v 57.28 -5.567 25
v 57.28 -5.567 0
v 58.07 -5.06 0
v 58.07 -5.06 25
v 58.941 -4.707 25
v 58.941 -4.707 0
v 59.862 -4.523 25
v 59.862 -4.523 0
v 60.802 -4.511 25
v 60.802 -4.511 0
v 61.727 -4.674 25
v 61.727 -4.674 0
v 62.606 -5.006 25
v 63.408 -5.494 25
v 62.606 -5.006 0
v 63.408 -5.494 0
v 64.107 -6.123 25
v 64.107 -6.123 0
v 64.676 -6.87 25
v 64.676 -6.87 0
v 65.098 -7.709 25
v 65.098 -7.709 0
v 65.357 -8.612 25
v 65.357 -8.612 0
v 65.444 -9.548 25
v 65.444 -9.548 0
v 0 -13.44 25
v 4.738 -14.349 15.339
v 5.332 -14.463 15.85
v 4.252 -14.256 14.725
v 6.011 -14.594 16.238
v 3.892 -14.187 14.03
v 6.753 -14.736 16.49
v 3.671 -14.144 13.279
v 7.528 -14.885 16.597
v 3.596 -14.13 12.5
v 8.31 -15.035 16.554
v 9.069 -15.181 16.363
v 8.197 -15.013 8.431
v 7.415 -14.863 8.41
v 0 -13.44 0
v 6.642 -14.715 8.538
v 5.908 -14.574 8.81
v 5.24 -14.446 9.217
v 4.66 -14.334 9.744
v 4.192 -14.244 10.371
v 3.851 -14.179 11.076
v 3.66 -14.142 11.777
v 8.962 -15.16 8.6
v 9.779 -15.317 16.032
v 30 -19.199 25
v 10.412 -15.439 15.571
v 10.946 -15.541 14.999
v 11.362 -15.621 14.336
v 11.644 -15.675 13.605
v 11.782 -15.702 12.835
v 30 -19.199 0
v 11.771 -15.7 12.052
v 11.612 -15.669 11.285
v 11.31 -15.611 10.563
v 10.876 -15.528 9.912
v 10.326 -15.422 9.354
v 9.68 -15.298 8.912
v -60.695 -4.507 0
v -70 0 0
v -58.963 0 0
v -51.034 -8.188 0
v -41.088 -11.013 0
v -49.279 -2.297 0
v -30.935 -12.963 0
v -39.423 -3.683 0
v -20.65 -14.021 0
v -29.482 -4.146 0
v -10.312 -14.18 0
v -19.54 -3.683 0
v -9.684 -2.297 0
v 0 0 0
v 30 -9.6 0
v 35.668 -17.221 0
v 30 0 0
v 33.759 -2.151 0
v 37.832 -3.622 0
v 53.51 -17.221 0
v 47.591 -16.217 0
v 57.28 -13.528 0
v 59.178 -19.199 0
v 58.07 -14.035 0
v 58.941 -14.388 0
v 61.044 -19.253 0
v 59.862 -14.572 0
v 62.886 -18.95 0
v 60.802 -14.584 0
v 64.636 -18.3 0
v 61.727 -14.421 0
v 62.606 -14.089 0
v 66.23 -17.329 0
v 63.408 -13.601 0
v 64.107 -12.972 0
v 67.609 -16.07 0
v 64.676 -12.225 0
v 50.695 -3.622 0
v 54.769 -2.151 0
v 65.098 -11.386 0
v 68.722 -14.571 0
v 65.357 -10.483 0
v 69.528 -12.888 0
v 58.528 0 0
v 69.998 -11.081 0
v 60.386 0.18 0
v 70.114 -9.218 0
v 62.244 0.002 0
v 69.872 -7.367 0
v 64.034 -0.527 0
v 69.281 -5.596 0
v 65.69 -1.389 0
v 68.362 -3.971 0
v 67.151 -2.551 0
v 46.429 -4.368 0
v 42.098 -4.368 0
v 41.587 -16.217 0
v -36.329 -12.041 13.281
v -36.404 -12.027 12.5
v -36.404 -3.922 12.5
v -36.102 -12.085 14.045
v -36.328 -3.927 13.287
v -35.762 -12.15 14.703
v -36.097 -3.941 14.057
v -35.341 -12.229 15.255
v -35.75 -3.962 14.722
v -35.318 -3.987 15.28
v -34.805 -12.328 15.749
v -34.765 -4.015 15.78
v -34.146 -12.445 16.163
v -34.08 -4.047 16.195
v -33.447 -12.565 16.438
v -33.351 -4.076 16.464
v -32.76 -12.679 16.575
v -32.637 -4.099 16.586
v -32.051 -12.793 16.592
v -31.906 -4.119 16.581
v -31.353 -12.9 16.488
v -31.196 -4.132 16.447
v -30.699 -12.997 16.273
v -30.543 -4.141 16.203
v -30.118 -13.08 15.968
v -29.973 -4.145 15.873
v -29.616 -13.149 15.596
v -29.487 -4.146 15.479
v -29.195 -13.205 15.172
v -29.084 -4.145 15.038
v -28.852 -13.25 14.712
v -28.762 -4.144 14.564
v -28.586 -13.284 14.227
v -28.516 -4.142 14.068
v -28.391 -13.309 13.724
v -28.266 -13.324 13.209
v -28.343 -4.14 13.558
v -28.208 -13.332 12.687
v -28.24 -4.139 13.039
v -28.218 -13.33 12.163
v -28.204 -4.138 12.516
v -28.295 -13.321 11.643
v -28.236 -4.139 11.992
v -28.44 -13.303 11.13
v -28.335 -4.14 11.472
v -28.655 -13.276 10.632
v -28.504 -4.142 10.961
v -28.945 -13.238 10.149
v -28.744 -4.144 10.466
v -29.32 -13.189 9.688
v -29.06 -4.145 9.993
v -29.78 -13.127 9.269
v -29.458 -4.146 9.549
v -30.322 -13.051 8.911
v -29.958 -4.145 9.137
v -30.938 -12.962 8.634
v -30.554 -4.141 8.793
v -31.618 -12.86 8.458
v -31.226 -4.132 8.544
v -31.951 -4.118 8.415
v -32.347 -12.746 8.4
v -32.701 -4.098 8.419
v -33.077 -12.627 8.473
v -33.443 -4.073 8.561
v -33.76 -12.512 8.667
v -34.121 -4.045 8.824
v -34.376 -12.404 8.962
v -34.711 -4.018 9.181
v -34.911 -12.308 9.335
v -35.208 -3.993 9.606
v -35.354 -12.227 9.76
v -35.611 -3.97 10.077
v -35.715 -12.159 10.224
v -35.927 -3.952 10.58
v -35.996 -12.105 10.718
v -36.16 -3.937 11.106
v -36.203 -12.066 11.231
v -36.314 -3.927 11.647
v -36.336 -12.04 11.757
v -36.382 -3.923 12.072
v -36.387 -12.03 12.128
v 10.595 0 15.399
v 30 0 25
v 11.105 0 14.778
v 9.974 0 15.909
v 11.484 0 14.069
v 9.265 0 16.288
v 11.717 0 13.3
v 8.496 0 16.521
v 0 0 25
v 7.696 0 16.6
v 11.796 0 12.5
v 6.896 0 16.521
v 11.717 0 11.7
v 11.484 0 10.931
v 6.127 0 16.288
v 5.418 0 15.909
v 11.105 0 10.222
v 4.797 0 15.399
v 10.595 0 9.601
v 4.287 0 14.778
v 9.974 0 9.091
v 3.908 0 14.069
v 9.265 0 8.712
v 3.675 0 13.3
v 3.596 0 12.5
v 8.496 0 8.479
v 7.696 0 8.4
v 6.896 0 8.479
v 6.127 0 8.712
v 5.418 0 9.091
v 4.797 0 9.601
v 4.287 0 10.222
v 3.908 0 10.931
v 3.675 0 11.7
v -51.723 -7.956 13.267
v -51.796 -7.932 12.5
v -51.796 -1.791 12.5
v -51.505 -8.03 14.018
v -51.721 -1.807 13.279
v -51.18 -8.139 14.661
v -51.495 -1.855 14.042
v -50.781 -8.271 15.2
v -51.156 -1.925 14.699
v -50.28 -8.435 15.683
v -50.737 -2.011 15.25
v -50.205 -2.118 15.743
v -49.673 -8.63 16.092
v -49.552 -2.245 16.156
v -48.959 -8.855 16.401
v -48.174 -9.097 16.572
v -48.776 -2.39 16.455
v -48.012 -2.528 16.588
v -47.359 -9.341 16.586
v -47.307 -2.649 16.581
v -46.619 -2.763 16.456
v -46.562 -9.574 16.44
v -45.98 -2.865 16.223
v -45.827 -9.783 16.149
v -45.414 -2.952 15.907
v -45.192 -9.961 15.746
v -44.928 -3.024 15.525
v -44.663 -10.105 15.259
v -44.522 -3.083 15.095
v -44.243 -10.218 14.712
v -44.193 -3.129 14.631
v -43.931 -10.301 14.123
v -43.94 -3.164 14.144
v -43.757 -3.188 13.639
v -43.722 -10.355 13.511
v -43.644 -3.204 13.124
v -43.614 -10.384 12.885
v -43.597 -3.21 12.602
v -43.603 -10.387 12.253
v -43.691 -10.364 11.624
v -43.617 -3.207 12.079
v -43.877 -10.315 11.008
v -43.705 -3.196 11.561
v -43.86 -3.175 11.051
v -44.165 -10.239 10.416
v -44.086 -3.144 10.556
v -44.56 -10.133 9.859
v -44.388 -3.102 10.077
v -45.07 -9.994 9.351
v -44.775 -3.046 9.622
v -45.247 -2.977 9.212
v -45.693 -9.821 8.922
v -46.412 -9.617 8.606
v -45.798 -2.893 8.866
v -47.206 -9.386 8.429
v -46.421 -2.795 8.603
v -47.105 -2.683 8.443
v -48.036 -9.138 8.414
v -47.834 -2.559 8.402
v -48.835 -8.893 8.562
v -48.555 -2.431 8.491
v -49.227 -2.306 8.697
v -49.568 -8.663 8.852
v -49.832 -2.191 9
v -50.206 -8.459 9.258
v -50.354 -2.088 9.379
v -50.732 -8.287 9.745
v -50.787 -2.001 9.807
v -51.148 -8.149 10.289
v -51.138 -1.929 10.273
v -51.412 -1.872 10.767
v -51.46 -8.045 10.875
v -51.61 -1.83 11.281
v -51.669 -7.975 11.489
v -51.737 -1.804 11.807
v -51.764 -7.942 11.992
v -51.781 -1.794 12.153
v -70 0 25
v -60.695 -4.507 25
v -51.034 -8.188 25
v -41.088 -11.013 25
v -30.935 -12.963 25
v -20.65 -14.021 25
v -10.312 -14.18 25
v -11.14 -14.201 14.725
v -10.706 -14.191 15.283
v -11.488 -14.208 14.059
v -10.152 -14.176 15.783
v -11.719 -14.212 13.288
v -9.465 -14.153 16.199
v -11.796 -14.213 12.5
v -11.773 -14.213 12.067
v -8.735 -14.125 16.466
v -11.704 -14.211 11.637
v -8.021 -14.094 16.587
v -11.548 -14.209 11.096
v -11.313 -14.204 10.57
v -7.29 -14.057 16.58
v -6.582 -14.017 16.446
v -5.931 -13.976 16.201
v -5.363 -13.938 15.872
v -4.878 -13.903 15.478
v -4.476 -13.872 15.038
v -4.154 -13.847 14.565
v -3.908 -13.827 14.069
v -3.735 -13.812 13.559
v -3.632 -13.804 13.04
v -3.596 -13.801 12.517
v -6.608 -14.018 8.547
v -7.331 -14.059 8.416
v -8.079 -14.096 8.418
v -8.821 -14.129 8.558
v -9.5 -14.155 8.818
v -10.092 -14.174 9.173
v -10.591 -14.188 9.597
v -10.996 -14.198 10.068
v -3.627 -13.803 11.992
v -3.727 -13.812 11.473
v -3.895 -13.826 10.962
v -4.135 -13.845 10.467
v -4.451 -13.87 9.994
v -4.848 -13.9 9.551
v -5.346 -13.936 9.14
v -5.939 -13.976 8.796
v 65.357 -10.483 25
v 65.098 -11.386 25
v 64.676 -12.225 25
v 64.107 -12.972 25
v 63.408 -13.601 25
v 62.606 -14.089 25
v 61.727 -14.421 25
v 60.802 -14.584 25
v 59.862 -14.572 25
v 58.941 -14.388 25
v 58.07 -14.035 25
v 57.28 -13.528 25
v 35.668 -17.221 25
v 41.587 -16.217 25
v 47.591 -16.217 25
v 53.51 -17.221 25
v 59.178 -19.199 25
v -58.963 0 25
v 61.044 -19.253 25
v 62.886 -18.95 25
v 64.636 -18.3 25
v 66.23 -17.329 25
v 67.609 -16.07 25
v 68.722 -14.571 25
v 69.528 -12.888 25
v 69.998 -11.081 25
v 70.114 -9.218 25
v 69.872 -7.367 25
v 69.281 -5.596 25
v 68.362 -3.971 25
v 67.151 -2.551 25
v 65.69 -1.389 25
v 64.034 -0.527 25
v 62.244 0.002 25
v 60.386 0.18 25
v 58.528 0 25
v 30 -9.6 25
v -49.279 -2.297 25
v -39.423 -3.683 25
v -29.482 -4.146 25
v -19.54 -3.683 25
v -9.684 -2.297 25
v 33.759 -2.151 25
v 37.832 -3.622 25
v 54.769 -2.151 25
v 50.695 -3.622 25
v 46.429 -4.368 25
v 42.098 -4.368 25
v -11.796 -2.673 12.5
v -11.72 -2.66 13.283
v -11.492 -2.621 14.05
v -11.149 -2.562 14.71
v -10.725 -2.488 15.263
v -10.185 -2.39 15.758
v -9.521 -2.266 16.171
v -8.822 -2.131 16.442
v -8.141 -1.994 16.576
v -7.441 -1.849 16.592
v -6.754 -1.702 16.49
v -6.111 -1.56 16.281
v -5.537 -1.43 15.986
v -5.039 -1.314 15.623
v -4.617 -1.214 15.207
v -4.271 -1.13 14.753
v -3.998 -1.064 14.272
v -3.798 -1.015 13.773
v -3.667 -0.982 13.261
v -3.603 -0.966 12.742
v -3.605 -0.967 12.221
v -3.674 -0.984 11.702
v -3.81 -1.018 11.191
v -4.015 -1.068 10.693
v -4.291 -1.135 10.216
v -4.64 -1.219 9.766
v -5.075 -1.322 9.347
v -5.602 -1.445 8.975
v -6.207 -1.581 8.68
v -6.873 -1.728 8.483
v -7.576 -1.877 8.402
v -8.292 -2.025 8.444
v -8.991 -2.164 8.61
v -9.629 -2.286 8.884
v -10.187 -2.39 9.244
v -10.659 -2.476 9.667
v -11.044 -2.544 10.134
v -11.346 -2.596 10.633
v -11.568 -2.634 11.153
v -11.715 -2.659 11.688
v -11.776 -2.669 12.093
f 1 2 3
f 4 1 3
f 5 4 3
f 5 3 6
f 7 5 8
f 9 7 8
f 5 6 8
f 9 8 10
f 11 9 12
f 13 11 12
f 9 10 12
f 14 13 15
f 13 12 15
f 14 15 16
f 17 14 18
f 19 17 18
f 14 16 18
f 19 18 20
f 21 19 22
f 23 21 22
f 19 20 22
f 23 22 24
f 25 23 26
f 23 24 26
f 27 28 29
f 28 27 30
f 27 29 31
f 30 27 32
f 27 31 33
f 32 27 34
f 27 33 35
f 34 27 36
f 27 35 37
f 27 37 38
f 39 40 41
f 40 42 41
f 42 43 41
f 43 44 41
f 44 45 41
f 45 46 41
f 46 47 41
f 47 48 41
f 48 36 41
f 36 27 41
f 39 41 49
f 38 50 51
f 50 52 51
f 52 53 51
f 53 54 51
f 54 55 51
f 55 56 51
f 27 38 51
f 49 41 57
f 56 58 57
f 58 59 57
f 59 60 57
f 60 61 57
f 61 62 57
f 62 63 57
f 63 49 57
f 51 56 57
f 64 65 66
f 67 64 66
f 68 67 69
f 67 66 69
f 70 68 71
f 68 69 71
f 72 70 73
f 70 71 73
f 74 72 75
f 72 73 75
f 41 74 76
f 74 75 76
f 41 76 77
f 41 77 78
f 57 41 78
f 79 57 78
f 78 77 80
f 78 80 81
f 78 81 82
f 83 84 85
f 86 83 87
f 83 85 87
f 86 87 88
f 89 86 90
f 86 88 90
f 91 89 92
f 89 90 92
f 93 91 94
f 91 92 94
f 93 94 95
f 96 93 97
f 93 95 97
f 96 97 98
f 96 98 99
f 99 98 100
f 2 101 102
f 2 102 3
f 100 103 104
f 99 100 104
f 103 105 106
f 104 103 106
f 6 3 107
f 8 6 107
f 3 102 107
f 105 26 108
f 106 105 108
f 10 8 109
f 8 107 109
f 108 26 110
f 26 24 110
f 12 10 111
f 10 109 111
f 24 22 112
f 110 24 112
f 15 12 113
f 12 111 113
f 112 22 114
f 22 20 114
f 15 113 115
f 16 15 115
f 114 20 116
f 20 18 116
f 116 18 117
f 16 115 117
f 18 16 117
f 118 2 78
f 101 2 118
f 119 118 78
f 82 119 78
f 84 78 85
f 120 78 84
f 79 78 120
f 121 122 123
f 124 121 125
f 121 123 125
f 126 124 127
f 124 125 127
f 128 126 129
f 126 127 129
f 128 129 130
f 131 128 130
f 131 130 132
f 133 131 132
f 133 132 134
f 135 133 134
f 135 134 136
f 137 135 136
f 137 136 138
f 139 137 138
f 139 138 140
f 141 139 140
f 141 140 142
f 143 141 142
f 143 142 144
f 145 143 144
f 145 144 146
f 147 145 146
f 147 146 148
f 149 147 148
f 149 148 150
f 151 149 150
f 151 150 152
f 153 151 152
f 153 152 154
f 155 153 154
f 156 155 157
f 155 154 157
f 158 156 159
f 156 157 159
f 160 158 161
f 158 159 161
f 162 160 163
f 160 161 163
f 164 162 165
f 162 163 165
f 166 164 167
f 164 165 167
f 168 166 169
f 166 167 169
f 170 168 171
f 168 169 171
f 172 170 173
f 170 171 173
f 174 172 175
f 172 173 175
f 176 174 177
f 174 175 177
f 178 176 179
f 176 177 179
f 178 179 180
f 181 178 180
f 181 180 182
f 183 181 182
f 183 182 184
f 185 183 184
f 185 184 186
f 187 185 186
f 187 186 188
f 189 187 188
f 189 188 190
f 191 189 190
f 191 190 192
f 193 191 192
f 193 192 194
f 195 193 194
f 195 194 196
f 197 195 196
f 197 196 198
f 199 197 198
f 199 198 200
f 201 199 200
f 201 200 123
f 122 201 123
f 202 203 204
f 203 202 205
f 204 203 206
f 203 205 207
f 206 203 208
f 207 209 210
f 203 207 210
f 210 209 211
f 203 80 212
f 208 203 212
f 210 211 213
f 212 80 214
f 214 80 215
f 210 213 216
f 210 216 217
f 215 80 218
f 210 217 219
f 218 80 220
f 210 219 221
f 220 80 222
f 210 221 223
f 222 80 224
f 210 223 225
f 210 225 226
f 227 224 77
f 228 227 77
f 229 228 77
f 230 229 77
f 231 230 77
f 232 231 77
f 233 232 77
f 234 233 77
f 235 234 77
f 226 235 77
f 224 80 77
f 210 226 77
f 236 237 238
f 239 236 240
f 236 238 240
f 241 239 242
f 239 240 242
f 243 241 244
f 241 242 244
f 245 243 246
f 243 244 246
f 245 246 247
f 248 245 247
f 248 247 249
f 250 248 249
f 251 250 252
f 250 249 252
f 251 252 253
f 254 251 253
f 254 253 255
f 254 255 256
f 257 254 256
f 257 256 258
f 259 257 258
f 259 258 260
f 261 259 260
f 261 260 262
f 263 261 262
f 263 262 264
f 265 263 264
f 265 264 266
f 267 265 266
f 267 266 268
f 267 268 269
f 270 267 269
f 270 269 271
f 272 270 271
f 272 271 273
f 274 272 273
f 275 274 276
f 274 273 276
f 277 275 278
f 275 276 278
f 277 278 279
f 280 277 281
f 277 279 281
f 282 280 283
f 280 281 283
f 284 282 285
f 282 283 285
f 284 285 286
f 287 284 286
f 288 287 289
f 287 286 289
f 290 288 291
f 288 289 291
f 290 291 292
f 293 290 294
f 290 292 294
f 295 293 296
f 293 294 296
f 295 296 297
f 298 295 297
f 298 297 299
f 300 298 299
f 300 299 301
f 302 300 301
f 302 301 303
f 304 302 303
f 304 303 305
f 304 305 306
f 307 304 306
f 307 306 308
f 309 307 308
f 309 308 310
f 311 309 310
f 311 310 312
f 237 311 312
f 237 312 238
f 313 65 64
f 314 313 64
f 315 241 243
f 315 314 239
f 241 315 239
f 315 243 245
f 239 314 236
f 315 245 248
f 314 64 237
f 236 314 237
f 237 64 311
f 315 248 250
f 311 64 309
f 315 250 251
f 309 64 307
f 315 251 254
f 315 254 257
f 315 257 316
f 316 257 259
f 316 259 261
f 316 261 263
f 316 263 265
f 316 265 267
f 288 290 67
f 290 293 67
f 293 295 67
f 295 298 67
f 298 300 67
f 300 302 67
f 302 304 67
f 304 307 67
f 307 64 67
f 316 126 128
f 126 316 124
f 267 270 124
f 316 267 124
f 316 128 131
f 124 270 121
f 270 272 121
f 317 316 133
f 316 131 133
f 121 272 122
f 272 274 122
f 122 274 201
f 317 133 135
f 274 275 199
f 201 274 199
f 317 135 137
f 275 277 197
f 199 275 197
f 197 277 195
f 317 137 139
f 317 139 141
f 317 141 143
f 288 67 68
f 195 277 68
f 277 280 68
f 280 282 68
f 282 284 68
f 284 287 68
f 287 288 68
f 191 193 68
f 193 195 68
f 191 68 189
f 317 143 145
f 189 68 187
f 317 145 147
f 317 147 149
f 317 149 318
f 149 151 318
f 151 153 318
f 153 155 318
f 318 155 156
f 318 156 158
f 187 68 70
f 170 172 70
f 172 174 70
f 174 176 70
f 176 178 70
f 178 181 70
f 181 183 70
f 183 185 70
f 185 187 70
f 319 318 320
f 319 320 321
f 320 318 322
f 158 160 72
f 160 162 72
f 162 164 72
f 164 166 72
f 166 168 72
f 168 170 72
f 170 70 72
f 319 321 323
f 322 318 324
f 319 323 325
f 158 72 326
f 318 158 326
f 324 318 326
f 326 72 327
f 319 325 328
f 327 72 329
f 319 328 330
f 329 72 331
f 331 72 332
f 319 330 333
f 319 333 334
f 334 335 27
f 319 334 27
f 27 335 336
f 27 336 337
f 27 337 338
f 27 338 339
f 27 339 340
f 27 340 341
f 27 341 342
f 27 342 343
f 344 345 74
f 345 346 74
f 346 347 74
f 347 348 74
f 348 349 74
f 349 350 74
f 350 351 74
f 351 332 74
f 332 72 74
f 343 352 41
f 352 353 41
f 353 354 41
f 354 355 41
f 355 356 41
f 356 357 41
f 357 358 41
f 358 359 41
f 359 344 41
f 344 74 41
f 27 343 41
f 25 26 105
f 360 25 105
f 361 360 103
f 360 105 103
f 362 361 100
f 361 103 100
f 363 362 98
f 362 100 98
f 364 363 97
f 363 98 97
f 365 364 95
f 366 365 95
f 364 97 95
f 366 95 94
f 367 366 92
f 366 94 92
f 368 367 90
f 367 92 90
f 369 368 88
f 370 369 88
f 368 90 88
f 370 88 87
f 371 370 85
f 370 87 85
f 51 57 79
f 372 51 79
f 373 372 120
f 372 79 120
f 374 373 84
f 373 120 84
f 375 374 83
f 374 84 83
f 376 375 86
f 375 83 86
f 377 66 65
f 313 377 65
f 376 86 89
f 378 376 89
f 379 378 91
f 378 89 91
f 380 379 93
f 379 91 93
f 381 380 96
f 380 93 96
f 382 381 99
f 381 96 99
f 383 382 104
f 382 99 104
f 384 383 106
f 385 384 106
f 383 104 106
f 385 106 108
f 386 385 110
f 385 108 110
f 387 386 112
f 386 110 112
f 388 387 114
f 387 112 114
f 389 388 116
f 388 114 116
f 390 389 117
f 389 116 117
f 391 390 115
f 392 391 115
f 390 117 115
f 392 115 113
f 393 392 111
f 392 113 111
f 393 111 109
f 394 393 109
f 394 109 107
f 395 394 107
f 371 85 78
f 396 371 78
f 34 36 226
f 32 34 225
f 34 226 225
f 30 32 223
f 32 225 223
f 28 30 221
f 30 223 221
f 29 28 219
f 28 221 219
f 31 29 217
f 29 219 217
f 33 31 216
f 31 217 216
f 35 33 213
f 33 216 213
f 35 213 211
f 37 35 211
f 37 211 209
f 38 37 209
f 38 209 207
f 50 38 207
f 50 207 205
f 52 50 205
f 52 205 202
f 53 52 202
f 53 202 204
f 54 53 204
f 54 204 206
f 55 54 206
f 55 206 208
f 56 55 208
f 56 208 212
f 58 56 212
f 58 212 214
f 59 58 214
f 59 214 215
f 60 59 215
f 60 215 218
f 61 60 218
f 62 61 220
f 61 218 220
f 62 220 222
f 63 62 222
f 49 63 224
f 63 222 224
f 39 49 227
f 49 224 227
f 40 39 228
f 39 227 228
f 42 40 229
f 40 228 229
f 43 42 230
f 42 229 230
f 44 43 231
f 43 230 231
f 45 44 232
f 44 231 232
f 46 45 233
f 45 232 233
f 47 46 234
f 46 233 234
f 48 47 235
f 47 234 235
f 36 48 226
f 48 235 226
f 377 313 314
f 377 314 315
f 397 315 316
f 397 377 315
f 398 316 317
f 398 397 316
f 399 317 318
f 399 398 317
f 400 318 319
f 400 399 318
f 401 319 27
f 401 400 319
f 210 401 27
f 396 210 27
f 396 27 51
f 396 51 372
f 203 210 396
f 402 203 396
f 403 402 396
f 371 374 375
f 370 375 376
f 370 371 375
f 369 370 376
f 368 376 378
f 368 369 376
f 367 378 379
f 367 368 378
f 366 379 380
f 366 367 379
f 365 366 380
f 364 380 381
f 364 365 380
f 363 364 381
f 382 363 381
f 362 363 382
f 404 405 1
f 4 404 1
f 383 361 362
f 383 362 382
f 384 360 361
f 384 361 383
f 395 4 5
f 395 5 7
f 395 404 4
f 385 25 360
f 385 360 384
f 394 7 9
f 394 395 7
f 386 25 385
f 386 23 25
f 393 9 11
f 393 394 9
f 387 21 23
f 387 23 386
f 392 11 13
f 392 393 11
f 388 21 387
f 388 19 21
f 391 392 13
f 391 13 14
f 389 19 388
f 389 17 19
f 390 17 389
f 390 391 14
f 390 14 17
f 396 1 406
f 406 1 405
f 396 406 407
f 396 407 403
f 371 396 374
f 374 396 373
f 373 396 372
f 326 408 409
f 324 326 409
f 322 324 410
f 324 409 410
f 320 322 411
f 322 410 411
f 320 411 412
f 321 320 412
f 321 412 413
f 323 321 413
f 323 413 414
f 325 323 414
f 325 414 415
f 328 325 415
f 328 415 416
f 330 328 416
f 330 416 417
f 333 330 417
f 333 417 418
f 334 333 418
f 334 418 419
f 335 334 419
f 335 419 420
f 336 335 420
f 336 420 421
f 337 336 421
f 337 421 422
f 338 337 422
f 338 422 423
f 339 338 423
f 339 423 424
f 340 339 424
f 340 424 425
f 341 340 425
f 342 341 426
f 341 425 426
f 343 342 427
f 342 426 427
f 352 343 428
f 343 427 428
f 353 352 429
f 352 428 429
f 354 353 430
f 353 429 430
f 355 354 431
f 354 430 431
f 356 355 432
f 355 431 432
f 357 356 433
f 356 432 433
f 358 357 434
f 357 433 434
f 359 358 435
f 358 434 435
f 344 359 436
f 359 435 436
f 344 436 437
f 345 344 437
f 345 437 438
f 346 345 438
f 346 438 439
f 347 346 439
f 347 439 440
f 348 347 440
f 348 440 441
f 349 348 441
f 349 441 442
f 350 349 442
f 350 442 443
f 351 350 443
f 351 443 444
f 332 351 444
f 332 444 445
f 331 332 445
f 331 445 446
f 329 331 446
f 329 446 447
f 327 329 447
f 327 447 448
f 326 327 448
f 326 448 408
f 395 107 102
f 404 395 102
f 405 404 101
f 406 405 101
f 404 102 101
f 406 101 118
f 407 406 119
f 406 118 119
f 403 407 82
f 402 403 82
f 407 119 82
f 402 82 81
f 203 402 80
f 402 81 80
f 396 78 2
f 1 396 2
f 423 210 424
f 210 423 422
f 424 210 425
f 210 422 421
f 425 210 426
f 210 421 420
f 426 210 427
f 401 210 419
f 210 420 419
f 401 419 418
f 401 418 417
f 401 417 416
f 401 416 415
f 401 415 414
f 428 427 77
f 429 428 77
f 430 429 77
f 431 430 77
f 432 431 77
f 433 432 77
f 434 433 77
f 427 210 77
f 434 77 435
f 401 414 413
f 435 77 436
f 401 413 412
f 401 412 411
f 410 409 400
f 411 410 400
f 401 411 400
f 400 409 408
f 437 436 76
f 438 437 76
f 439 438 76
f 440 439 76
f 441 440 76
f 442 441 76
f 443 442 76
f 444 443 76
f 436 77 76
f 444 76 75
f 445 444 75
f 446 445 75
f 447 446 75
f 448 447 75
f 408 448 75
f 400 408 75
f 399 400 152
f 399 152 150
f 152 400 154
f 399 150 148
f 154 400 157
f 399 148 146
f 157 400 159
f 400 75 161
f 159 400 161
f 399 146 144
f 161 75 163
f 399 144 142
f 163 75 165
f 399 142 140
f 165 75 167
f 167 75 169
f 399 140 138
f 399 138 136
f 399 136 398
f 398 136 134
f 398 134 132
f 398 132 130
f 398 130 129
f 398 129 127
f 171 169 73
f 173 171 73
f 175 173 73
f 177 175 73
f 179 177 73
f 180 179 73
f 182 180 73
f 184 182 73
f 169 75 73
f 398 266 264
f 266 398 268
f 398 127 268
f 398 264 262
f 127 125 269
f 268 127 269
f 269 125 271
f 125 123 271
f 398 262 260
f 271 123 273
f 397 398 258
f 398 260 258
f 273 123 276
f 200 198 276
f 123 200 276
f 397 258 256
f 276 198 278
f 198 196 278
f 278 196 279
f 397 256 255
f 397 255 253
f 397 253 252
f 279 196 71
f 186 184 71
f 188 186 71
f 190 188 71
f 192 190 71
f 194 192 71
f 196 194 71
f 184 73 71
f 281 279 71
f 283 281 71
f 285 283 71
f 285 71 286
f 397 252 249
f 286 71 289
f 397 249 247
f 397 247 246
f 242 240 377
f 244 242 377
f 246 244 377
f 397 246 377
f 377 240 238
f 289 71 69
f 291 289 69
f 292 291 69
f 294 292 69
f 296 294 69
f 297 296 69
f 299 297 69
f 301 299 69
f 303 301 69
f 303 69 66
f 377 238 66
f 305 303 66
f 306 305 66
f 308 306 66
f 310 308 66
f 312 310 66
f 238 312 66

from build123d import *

# Parameters (mm, degrees)
F1_DEPTH = 25
F2_R     = 4.1
F3_DEPTH = 25


with BuildPart() as f1:
    # F0 (on Top) → F1 (new body)
    with BuildSketch(Plane.XY):
        with BuildLine():
            ThreePointArc((-70, 0), (-36.032673, -12.098464), (0, -13.439566))
            Line((0, -13.439566), (30, -19.199381))
            ThreePointArc((30, -19.199381), (44.589191, -16.091), (59.178382, -19.199381))
            ThreePointArc((59.178382, -19.199381), (70.113907, -9.217961), (58.527552, 0))
            ThreePointArc((58.527552, 0), (44.263776, -4.461903), (30, 0))
            Line((30, 0), (0, 0))
            ThreePointArc((0, 0), (-29.481515, -4.146069), (-58.963031, 0))
            Line((-58.963031, 0), (-70, 0))
        make_face()
        with BuildLine():
            ThreePointArc((57.279562, -5.566995), (62.605872, -5.005802), (65.444396, -9.54753))
            ThreePointArc((65.444396, -9.54753), (62.605872, -14.089259), (57.279562, -13.528066))
            Line((57.279562, -13.528066), (30, -9.59969))
            Line((30, -9.59969), (57.279562, -5.566995))
        make_face(mode=Mode.SUBTRACT)
    extrude(amount=F1_DEPTH)

    # F2 (on face) → F3 (cut)
    with BuildSketch(Plane(origin=(0, 0, 0), x_dir=(-1, 0, 0), z_dir=(0, 1, 0))):
        with Locations((-7.695812, 12.5)):
            Circle(F2_R)
        with Locations((7.695812, 12.5)):
            Circle(F2_R)
        with Locations((32.304188, 12.5)):
            Circle(F2_R)
        with Locations((47.695812, 12.5)):
            Circle(F2_R)
    extrude(amount=-F3_DEPTH, mode=Mode.SUBTRACT)


solid = f1.part
